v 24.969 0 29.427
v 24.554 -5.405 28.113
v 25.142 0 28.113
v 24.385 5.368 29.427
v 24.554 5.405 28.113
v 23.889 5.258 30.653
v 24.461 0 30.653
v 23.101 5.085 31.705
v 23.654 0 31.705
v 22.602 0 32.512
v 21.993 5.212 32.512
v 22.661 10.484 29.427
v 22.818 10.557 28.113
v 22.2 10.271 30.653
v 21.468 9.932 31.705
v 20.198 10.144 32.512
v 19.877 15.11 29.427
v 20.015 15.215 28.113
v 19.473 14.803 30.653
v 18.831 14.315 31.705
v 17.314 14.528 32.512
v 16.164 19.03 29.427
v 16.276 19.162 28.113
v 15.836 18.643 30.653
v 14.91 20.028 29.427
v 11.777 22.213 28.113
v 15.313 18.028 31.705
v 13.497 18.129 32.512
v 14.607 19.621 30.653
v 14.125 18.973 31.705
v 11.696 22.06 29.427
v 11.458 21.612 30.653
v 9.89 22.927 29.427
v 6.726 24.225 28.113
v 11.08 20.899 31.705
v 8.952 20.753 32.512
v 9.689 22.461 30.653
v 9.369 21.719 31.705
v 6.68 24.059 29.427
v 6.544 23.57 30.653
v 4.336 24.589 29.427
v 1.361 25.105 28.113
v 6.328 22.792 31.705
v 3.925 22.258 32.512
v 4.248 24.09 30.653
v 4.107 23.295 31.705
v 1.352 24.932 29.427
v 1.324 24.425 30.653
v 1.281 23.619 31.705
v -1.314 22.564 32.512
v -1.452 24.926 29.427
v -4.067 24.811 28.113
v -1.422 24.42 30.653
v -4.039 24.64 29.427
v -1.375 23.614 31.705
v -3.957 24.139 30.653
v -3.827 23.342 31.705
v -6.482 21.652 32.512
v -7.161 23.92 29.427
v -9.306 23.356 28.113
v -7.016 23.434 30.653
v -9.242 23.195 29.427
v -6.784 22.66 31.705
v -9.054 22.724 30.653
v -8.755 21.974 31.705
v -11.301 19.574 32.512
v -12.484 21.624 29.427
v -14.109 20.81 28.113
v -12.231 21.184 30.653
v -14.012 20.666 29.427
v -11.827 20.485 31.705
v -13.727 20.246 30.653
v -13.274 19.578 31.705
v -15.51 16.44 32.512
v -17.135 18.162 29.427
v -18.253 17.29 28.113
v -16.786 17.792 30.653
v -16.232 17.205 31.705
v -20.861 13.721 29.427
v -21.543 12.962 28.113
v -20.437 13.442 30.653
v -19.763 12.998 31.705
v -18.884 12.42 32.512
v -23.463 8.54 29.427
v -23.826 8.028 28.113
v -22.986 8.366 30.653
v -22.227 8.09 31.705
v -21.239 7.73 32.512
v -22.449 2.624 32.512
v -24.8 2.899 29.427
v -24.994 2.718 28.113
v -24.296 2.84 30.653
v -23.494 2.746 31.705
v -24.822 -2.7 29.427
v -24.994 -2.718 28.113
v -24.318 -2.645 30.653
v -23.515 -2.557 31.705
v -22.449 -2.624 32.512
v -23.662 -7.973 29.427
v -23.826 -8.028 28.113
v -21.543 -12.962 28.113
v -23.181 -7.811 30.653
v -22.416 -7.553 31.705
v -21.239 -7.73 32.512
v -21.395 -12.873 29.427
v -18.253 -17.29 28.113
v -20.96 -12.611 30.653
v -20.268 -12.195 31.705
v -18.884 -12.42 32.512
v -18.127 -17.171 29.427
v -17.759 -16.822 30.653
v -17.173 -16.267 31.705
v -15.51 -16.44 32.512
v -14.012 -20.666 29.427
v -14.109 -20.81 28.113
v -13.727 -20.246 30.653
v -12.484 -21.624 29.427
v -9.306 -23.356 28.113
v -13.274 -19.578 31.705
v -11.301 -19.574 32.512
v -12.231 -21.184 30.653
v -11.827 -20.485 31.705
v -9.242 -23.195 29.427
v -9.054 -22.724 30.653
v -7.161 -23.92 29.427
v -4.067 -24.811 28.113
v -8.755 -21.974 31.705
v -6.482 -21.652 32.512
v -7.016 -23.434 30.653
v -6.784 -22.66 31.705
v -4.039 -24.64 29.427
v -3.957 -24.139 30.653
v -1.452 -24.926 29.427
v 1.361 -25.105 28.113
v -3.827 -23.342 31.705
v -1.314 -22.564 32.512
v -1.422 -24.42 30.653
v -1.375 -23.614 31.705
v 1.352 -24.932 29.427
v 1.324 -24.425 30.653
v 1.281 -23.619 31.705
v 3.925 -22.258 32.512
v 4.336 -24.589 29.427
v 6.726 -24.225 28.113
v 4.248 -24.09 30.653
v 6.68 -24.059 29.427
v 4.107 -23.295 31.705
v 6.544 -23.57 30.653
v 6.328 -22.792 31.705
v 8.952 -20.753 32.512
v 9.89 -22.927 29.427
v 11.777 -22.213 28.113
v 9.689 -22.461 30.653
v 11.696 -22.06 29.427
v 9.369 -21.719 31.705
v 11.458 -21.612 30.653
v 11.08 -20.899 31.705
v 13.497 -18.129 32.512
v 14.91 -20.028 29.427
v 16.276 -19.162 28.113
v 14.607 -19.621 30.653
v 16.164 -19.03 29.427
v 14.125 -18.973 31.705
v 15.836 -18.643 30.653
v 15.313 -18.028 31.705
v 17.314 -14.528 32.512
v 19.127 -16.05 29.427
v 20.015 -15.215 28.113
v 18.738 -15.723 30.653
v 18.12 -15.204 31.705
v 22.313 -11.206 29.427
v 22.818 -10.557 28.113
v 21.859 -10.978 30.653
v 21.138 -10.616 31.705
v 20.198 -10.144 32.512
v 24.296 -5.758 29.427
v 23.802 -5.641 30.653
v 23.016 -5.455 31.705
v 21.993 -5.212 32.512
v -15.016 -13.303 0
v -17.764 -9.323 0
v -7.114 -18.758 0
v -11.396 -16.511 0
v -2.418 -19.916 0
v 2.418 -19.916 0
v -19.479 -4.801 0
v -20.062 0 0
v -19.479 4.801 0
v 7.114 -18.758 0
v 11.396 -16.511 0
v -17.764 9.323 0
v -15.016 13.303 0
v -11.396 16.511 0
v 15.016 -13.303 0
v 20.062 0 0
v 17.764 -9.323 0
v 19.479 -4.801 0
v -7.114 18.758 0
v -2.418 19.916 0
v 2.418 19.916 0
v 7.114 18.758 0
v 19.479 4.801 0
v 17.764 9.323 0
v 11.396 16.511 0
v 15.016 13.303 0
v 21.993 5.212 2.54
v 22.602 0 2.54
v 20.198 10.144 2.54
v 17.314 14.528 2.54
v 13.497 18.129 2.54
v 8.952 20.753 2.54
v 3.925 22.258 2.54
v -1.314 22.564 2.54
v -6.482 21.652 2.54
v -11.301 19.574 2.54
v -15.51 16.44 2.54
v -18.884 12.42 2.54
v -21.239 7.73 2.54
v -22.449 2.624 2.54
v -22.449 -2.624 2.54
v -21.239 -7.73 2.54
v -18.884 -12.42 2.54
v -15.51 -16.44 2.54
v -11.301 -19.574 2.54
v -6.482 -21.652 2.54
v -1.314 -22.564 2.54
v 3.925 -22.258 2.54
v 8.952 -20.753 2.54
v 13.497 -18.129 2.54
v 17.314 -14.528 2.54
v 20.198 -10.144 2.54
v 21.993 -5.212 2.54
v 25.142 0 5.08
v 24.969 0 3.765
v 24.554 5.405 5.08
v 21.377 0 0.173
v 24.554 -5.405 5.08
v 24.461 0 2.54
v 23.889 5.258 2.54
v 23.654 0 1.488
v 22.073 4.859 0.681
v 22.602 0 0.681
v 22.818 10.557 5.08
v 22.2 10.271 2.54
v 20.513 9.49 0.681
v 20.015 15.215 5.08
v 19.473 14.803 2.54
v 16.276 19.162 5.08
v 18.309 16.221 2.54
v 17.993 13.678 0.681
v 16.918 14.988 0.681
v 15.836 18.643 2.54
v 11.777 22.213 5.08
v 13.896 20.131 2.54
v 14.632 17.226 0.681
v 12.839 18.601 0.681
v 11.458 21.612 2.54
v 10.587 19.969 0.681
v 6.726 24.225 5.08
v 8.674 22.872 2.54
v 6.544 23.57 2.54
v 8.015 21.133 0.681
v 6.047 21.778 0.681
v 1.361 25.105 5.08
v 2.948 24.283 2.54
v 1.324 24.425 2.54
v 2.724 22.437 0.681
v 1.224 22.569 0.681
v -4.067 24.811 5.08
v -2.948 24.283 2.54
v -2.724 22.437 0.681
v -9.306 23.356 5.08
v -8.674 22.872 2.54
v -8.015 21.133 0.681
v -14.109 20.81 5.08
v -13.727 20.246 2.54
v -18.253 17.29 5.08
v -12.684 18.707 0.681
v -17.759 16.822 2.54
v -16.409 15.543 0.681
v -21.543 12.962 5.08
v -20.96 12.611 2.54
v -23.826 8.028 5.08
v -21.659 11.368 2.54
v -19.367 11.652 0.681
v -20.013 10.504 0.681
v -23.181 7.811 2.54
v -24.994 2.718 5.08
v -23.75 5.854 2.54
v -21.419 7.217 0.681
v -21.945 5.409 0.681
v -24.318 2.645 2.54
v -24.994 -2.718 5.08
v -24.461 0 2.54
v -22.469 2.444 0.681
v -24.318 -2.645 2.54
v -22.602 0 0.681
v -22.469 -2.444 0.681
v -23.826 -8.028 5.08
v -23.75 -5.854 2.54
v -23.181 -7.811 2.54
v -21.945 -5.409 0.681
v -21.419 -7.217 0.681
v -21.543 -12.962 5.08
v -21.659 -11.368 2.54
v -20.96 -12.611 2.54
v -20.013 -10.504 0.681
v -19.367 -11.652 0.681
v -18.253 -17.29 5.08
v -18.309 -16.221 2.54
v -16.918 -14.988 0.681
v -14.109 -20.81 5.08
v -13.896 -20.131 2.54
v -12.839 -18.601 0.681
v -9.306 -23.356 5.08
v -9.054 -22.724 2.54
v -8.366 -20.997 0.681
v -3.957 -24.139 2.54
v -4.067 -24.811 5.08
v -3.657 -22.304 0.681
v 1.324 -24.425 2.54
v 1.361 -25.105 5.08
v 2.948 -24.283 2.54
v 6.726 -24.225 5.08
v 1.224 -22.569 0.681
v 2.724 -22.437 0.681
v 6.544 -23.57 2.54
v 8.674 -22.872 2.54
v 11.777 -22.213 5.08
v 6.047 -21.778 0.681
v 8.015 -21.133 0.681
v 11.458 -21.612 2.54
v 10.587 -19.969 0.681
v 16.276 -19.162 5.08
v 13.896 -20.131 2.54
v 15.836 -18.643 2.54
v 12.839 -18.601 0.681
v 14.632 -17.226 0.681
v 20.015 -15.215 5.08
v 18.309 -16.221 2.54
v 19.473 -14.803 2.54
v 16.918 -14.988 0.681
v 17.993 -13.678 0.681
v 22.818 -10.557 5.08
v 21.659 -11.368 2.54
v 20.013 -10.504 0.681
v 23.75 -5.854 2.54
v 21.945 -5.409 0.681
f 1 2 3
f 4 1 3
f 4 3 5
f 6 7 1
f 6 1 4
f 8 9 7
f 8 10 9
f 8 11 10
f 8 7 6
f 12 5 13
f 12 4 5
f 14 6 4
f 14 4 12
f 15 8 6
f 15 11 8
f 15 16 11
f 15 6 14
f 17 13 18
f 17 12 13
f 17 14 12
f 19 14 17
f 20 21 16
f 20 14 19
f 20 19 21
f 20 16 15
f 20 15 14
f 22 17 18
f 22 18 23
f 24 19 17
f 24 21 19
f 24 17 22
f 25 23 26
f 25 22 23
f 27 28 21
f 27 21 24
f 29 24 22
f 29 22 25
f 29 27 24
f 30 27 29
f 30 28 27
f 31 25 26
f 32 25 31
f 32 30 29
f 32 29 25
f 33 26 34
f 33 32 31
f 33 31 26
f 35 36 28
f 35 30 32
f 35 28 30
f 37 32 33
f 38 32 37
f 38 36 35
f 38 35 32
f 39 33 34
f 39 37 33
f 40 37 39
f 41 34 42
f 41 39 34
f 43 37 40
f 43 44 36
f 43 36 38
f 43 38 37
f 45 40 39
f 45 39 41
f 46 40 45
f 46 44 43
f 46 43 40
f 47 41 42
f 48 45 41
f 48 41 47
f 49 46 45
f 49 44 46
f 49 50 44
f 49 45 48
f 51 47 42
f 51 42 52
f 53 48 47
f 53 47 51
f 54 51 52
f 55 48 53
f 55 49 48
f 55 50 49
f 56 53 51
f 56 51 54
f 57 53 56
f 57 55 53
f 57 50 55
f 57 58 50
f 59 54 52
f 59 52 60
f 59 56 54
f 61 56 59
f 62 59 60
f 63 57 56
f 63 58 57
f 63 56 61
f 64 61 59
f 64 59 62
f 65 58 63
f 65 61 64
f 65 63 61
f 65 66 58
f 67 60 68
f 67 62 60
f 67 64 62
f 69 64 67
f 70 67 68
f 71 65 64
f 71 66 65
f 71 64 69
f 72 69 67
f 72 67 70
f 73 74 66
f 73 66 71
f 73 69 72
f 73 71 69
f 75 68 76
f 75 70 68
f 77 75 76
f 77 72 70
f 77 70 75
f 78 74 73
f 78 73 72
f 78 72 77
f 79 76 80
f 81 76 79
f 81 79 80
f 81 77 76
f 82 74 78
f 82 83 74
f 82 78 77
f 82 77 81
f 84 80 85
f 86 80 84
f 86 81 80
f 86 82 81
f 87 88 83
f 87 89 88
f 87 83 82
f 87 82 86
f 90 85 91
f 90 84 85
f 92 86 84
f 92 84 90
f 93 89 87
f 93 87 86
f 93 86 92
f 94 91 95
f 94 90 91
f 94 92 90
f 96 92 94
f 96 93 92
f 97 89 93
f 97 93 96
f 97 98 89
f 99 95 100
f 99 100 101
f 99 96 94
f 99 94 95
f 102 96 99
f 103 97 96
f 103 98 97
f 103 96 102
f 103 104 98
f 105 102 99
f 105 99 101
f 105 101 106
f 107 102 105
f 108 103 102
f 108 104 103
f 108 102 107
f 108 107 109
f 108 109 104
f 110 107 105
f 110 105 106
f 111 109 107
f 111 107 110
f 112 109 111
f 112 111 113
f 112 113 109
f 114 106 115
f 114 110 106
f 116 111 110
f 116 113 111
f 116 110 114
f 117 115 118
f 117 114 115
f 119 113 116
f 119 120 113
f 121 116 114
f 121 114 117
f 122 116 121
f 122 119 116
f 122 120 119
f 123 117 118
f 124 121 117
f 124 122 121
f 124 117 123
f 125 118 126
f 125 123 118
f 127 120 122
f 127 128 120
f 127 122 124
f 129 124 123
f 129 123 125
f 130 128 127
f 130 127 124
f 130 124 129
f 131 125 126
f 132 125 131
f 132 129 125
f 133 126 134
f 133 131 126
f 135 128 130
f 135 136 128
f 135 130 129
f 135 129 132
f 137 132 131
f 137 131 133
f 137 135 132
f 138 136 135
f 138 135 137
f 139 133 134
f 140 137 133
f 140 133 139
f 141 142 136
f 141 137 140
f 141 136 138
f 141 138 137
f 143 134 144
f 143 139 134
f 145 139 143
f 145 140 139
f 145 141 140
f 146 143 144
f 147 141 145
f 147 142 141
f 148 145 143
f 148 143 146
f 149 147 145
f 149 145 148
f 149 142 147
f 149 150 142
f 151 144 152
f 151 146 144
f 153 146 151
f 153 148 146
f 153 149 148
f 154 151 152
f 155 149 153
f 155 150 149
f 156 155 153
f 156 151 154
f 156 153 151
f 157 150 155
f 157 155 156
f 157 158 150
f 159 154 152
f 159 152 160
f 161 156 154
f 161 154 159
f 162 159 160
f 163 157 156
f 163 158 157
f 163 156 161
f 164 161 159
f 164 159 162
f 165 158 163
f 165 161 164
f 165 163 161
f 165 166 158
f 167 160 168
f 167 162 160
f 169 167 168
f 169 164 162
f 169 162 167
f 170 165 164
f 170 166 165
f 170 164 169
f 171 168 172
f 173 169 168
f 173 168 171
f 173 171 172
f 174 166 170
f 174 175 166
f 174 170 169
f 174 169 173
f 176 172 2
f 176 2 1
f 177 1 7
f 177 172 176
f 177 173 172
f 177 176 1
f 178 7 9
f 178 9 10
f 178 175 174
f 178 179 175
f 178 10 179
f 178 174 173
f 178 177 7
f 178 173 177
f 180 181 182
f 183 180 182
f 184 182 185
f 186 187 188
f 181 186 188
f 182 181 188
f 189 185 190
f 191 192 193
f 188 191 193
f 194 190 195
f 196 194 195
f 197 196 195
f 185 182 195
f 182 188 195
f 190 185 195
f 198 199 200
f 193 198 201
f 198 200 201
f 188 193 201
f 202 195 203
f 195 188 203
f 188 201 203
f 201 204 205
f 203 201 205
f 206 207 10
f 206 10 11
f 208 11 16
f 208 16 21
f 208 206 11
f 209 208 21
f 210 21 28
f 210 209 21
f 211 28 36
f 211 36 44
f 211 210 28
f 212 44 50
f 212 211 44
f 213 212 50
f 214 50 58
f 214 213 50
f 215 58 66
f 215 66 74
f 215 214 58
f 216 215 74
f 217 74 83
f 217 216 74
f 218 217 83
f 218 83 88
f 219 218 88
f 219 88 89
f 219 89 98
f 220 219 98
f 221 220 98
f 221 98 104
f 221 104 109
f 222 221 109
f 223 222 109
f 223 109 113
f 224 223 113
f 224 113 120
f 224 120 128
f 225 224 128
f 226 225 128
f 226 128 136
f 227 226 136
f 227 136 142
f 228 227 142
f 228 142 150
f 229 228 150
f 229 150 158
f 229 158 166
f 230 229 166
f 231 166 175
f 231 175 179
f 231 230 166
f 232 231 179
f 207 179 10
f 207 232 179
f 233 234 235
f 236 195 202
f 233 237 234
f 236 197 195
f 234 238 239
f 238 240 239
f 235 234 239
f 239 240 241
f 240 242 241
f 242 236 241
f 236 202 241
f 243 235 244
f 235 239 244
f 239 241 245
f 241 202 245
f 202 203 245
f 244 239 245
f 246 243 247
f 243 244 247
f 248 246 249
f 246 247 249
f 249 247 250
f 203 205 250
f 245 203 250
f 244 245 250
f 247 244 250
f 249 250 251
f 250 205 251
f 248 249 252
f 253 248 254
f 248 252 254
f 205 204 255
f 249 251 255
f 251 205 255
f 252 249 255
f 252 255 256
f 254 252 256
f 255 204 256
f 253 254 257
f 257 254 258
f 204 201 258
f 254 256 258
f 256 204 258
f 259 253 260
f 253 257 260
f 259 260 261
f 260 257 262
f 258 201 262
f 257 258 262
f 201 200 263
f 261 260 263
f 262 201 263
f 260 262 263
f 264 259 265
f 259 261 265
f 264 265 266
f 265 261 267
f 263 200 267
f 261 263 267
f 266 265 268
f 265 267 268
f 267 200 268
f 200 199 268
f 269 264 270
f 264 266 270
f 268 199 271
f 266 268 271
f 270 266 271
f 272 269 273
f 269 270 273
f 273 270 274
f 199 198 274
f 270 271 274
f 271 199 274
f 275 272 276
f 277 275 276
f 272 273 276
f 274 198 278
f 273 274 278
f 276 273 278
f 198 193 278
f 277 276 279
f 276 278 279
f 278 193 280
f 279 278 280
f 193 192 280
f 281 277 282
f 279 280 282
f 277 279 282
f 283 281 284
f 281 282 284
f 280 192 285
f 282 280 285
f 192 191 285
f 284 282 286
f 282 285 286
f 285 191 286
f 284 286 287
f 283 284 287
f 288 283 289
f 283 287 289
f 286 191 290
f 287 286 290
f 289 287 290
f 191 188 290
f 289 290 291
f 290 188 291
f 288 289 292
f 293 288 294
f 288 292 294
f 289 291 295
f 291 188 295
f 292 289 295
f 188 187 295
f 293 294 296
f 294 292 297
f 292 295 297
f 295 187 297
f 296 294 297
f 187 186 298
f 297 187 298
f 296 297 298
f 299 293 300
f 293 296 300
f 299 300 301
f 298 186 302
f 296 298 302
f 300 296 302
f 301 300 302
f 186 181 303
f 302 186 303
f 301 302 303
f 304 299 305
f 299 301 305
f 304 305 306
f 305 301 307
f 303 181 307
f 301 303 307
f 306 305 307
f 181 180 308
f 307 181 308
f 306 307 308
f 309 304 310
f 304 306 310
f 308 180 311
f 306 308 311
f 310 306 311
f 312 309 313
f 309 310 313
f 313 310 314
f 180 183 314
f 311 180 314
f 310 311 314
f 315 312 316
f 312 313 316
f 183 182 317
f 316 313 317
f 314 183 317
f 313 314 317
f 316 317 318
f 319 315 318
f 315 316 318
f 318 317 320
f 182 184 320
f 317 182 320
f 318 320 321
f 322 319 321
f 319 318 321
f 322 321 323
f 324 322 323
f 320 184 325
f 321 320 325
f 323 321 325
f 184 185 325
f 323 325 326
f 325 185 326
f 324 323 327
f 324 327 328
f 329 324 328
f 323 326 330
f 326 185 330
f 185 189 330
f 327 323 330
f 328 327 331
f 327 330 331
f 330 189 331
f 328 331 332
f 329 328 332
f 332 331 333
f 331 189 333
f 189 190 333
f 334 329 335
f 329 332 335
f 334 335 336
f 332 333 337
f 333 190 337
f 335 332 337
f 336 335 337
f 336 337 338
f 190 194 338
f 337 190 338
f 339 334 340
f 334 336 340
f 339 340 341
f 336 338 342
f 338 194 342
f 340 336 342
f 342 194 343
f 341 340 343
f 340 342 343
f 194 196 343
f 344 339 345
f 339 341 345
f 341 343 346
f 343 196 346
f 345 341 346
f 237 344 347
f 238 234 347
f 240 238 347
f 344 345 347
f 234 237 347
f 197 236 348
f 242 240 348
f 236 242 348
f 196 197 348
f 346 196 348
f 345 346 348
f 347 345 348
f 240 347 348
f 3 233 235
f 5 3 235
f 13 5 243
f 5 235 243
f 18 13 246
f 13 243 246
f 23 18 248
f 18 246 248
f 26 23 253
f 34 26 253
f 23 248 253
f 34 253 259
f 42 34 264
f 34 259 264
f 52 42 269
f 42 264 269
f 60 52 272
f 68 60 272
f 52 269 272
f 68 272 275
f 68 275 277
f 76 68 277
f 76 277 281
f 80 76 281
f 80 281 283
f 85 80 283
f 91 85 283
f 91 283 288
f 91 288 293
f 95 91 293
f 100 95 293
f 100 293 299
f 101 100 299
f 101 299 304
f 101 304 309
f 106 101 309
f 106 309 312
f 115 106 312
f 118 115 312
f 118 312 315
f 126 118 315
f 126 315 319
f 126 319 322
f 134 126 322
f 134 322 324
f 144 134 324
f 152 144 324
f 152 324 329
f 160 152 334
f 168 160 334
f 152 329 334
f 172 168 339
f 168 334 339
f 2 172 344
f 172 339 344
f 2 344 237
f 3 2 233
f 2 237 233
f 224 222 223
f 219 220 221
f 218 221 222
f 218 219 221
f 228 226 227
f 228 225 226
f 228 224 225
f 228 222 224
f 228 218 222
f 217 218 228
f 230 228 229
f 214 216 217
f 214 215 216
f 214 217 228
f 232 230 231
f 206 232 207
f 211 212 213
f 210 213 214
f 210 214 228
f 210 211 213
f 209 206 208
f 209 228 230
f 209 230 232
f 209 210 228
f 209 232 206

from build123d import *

# Parameters (mm, degrees)
F0_R     = 25.1418135505
F1_DEPTH = 32.512
F2_T     = -2.54


# Not quite as in the source:
# - a fillet or chamfer that OpenCascade refuses, or shapes differently, is made with other operations: its cross-section is extruded or revolved along the edge and cut away or added


with BuildPart() as f1:
    # F0 (on Top) → F1 (new body)
    with BuildSketch(Plane.XY):
        Circle(F0_R)
    extrude(amount=F1_DEPTH)

    # F2
    f2_openings = [f1.faces().sort_by_distance(p)[0] for p in [
        (0, 0, 32.512),
    ]]
    offset(amount=F2_T, openings=f2_openings)

    # F3: fillet of radius 5.08 on 3 edges, made by hand

    # F3_s1 → F3_t2 (revolve, cut)
    with BuildSketch(Plane.XZ):
        with BuildLine():
            ThreePointArc((25.1418135505, 28.1125909488), (24.4612226018, 30.6525909488), (22.6018135505, 32.512))
            Line((22.6018135505, 32.512), (22.6526135505, 32.599988181))
            ThreePointArc((22.6526135505, 32.599988181), (23.8718135505, 32.6136), (25.1418135505, 32.6136))
            Line((25.1418135505, 32.6136), (25.2434135505, 32.512))
            Line((25.2434135505, 32.512), (25.2434135505, 28.1125909488))
            Line((25.2434135505, 28.1125909488), (25.1418135505, 28.1125909488))
        make_face()
    revolve(axis=Axis((0, 0, 32.512), (0, 0, 1)), mode=Mode.SUBTRACT)

    # F3_s3 → F3_t4 (revolve, cut)
    with BuildSketch(Plane.XZ):
        with BuildLine():
            ThreePointArc((25.1418135505, 5.08), (23.653915999, 1.4878975516), (20.0618135505, 0))
            Line((20.0618135505, 0), (20.0618135505, -0.1016))
            Line((20.0618135505, -0.1016), (25.2434135505, -0.1016))
            Line((25.2434135505, -0.1016), (25.2434135505, 5.08))
            Line((25.2434135505, 5.08), (25.1418135505, 5.08))
        make_face()
    revolve(axis=Axis((0, 0, 0), (0, 0, 1)), mode=Mode.SUBTRACT)


solid = f1.part
